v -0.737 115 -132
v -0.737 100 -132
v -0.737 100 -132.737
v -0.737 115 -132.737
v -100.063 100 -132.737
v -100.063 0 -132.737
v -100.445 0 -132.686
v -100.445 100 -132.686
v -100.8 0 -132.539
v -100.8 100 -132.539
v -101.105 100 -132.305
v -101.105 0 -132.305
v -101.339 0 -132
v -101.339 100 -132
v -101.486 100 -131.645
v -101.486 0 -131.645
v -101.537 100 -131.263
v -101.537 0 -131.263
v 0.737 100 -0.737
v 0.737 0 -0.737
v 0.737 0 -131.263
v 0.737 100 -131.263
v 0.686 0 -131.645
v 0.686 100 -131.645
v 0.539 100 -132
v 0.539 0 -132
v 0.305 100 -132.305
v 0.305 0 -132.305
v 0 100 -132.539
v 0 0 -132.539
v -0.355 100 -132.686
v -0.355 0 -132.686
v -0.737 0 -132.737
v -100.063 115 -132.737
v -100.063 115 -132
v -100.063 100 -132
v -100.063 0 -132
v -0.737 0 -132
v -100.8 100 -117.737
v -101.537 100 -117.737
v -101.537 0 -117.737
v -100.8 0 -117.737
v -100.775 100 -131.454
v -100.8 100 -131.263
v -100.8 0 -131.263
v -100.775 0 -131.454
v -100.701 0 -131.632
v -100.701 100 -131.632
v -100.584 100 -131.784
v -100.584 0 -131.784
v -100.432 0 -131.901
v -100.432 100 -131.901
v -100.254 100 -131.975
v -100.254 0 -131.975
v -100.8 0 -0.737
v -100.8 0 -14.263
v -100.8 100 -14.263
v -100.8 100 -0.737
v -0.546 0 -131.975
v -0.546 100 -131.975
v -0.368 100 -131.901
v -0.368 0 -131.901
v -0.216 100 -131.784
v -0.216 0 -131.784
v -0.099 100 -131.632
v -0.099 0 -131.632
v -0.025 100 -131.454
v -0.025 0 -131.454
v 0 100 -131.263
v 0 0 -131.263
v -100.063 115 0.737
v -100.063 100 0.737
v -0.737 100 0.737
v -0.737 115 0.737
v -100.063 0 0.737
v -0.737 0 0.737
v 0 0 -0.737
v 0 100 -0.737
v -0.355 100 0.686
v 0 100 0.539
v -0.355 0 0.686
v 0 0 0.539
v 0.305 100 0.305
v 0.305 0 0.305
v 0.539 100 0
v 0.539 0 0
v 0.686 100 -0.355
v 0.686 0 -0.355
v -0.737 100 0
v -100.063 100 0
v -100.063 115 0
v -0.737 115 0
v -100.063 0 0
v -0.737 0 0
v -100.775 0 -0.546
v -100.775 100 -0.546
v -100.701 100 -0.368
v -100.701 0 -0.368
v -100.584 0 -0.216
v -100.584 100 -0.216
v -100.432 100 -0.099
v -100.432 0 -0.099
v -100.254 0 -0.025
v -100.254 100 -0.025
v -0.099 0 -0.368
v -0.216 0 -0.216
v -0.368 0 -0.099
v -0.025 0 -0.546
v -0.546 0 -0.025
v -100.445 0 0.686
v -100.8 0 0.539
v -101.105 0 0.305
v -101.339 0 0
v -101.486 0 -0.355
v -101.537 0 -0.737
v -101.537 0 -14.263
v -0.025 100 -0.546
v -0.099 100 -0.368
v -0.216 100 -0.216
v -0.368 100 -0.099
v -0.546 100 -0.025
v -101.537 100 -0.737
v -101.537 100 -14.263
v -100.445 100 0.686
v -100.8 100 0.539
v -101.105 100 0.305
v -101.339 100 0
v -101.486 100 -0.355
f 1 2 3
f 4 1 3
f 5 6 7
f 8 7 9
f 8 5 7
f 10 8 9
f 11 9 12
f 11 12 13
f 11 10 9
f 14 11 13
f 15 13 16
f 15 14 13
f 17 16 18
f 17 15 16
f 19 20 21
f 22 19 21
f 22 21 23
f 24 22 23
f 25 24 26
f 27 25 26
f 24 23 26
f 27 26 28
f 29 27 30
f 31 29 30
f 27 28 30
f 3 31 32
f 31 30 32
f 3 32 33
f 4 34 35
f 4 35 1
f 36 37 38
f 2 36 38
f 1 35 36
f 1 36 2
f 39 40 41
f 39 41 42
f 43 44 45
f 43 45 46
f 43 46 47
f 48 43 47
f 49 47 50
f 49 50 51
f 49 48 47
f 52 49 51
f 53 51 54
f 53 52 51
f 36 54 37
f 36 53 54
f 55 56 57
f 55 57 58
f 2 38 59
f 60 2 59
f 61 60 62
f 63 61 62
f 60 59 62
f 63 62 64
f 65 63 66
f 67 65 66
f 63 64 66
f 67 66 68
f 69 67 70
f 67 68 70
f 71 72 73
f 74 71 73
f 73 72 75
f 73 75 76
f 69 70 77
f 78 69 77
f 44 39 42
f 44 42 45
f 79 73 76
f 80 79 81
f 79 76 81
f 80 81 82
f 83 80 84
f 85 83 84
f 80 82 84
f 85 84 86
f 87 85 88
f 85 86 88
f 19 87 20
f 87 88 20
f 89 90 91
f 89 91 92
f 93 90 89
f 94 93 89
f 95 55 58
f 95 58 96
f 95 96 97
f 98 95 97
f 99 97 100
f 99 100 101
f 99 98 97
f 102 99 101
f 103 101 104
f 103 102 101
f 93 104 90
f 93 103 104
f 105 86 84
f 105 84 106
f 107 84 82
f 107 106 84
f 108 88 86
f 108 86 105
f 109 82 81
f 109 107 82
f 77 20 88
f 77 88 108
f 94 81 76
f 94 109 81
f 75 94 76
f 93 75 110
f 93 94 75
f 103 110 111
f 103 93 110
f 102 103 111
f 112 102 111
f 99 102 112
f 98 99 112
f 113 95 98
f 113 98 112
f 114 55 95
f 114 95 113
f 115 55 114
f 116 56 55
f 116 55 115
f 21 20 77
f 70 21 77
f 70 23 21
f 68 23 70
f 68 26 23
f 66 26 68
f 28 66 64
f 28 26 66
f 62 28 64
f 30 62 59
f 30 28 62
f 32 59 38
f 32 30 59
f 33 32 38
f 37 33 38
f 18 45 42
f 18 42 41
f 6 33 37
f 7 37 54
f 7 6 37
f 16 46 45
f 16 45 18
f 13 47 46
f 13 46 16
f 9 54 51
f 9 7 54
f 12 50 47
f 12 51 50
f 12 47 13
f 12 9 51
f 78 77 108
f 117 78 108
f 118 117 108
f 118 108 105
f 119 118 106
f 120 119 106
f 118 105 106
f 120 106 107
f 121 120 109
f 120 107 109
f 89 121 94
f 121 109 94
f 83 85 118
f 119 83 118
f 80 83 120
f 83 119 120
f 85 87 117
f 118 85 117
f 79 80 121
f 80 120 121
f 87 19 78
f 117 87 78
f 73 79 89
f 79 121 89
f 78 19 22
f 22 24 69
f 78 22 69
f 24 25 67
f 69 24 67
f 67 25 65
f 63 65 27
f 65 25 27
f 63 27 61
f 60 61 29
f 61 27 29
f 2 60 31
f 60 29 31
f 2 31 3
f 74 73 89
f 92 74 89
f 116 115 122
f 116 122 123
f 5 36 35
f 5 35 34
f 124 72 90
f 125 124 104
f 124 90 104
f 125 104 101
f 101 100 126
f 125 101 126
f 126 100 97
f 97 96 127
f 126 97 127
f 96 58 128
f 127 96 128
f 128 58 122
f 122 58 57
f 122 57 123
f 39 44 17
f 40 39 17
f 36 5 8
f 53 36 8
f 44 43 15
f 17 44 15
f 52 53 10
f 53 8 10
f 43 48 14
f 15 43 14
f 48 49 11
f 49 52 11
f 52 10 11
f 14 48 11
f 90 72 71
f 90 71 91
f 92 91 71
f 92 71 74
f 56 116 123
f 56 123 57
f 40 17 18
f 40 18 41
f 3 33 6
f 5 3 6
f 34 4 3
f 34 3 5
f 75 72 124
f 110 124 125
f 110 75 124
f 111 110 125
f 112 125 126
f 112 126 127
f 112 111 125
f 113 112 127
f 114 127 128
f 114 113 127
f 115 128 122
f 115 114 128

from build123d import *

# Parameters (mm, degrees)
BASE_FLANGE1_DEPTH      = 100
EDGE_FLANGE1_DEPTH      = 100
EDGE_FLANGE1_BEND_DEPTH = 100
SKETCH8_W               = 99.3268
SKETCH8_H               = 0.7366
BOSS_EXTRUDE1_DEPTH     = 15


# Sheet-metal steps are written as plain solids
with BuildPart() as part:
    # Sketch1 → Base-Flange1 (new body)
    with BuildSketch(Plane(origin=(0, 0, 0), x_dir=(1, 0, 0), z_dir=(0, 1, 0))):
        with BuildLine():
            Line((-100, 132), (-0.7366, 132))
            ThreePointArc((-0.7366, 132), (-0.215745145, 131.784254855), (0, 131.2634))
            Line((0, 131.2634), (0, 0.7366))
            ThreePointArc((0, 0.7366), (-0.215745145, 0.215745145), (-0.7366, 0))
            Line((-0.7366, 0), (-100, 0))
            Line((-100, 0), (-100, -0.7366))
            Line((-100, -0.7366), (-0.7366, -0.7366))
            ThreePointArc((-0.7366, -0.7366), (0.30510971, -0.30510971), (0.7366, 0.7366))
            Line((0.7366, 0.7366), (0.7366, 131.2634))
            ThreePointArc((0.7366, 131.2634), (0.30510971, 132.30510971), (-0.7366, 132.7366))
            Line((-0.7366, 132.7366), (-100, 132.7366))
            Line((-100, 132.7366), (-100, 132))
        make_face()
    extrude(amount=BASE_FLANGE1_DEPTH)

    # Edge-Flange1 section (across the edge) → Edge-Flange1 (add)
    with BuildSketch(Plane(origin=(-100.8, 100, -132), x_dir=(1, 0, 0), z_dir=(0, -1, 0))):
        with BuildLine():
            Line((-0.7366, 0.7366), (-0.7366, 14.2634))
            Line((-0.7366, 14.2634), (0, 14.2634))
            Line((0, 14.2634), (0, 0.7366))
            ThreePointArc((0, 0.7366), (0.215745145, 0.215745145), (0.7366, 0))
            Line((0.7366, 0), (0.8, 0))
            Line((0.8, 0), (0.8, -0.7366))
            Line((0.8, -0.7366), (0.7366, -0.7366))
            ThreePointArc((0.7366, -0.7366), (-0.30510971, -0.30510971), (-0.7366, 0.7366))
        make_face()
    extrude(amount=EDGE_FLANGE1_DEPTH)

    # Edge-Flange1 section 2 (across the edge) → Edge-Flange1 bend (add)
    with BuildSketch(Plane(origin=(-100.8, 0, 0), x_dir=(1, 0, 0), z_dir=(0, 1, 0))):
        with BuildLine():
            Line((-0.7366, 0.7366), (-0.7366, 14.2634))
            Line((-0.7366, 14.2634), (0, 14.2634))
            Line((0, 14.2634), (0, 0.7366))
            ThreePointArc((0, 0.7366), (0.215745145, 0.215745145), (0.7366, 0))
            Line((0.7366, 0), (0.8, 0))
            Line((0.8, 0), (0.8, -0.7366))
            Line((0.8, -0.7366), (0.7366, -0.7366))
            ThreePointArc((0.7366, -0.7366), (-0.30510971, -0.30510971), (-0.7366, 0.7366))
        make_face()
    extrude(amount=EDGE_FLANGE1_BEND_DEPTH)

    # Sketch8 → Boss-Extrude1 (add)
    with BuildSketch(Plane(origin=(0, 100, 0), x_dir=(1, 0, 0), z_dir=(0, 1, 0))):
        with Locations((-50.4, -0.3683)):
            Rectangle(SKETCH8_W, SKETCH8_H)
        with Locations((-50.4, 132.3683)):
            Rectangle(SKETCH8_W, SKETCH8_H)
    extrude(amount=BOSS_EXTRUDE1_DEPTH)


solid = part.part
